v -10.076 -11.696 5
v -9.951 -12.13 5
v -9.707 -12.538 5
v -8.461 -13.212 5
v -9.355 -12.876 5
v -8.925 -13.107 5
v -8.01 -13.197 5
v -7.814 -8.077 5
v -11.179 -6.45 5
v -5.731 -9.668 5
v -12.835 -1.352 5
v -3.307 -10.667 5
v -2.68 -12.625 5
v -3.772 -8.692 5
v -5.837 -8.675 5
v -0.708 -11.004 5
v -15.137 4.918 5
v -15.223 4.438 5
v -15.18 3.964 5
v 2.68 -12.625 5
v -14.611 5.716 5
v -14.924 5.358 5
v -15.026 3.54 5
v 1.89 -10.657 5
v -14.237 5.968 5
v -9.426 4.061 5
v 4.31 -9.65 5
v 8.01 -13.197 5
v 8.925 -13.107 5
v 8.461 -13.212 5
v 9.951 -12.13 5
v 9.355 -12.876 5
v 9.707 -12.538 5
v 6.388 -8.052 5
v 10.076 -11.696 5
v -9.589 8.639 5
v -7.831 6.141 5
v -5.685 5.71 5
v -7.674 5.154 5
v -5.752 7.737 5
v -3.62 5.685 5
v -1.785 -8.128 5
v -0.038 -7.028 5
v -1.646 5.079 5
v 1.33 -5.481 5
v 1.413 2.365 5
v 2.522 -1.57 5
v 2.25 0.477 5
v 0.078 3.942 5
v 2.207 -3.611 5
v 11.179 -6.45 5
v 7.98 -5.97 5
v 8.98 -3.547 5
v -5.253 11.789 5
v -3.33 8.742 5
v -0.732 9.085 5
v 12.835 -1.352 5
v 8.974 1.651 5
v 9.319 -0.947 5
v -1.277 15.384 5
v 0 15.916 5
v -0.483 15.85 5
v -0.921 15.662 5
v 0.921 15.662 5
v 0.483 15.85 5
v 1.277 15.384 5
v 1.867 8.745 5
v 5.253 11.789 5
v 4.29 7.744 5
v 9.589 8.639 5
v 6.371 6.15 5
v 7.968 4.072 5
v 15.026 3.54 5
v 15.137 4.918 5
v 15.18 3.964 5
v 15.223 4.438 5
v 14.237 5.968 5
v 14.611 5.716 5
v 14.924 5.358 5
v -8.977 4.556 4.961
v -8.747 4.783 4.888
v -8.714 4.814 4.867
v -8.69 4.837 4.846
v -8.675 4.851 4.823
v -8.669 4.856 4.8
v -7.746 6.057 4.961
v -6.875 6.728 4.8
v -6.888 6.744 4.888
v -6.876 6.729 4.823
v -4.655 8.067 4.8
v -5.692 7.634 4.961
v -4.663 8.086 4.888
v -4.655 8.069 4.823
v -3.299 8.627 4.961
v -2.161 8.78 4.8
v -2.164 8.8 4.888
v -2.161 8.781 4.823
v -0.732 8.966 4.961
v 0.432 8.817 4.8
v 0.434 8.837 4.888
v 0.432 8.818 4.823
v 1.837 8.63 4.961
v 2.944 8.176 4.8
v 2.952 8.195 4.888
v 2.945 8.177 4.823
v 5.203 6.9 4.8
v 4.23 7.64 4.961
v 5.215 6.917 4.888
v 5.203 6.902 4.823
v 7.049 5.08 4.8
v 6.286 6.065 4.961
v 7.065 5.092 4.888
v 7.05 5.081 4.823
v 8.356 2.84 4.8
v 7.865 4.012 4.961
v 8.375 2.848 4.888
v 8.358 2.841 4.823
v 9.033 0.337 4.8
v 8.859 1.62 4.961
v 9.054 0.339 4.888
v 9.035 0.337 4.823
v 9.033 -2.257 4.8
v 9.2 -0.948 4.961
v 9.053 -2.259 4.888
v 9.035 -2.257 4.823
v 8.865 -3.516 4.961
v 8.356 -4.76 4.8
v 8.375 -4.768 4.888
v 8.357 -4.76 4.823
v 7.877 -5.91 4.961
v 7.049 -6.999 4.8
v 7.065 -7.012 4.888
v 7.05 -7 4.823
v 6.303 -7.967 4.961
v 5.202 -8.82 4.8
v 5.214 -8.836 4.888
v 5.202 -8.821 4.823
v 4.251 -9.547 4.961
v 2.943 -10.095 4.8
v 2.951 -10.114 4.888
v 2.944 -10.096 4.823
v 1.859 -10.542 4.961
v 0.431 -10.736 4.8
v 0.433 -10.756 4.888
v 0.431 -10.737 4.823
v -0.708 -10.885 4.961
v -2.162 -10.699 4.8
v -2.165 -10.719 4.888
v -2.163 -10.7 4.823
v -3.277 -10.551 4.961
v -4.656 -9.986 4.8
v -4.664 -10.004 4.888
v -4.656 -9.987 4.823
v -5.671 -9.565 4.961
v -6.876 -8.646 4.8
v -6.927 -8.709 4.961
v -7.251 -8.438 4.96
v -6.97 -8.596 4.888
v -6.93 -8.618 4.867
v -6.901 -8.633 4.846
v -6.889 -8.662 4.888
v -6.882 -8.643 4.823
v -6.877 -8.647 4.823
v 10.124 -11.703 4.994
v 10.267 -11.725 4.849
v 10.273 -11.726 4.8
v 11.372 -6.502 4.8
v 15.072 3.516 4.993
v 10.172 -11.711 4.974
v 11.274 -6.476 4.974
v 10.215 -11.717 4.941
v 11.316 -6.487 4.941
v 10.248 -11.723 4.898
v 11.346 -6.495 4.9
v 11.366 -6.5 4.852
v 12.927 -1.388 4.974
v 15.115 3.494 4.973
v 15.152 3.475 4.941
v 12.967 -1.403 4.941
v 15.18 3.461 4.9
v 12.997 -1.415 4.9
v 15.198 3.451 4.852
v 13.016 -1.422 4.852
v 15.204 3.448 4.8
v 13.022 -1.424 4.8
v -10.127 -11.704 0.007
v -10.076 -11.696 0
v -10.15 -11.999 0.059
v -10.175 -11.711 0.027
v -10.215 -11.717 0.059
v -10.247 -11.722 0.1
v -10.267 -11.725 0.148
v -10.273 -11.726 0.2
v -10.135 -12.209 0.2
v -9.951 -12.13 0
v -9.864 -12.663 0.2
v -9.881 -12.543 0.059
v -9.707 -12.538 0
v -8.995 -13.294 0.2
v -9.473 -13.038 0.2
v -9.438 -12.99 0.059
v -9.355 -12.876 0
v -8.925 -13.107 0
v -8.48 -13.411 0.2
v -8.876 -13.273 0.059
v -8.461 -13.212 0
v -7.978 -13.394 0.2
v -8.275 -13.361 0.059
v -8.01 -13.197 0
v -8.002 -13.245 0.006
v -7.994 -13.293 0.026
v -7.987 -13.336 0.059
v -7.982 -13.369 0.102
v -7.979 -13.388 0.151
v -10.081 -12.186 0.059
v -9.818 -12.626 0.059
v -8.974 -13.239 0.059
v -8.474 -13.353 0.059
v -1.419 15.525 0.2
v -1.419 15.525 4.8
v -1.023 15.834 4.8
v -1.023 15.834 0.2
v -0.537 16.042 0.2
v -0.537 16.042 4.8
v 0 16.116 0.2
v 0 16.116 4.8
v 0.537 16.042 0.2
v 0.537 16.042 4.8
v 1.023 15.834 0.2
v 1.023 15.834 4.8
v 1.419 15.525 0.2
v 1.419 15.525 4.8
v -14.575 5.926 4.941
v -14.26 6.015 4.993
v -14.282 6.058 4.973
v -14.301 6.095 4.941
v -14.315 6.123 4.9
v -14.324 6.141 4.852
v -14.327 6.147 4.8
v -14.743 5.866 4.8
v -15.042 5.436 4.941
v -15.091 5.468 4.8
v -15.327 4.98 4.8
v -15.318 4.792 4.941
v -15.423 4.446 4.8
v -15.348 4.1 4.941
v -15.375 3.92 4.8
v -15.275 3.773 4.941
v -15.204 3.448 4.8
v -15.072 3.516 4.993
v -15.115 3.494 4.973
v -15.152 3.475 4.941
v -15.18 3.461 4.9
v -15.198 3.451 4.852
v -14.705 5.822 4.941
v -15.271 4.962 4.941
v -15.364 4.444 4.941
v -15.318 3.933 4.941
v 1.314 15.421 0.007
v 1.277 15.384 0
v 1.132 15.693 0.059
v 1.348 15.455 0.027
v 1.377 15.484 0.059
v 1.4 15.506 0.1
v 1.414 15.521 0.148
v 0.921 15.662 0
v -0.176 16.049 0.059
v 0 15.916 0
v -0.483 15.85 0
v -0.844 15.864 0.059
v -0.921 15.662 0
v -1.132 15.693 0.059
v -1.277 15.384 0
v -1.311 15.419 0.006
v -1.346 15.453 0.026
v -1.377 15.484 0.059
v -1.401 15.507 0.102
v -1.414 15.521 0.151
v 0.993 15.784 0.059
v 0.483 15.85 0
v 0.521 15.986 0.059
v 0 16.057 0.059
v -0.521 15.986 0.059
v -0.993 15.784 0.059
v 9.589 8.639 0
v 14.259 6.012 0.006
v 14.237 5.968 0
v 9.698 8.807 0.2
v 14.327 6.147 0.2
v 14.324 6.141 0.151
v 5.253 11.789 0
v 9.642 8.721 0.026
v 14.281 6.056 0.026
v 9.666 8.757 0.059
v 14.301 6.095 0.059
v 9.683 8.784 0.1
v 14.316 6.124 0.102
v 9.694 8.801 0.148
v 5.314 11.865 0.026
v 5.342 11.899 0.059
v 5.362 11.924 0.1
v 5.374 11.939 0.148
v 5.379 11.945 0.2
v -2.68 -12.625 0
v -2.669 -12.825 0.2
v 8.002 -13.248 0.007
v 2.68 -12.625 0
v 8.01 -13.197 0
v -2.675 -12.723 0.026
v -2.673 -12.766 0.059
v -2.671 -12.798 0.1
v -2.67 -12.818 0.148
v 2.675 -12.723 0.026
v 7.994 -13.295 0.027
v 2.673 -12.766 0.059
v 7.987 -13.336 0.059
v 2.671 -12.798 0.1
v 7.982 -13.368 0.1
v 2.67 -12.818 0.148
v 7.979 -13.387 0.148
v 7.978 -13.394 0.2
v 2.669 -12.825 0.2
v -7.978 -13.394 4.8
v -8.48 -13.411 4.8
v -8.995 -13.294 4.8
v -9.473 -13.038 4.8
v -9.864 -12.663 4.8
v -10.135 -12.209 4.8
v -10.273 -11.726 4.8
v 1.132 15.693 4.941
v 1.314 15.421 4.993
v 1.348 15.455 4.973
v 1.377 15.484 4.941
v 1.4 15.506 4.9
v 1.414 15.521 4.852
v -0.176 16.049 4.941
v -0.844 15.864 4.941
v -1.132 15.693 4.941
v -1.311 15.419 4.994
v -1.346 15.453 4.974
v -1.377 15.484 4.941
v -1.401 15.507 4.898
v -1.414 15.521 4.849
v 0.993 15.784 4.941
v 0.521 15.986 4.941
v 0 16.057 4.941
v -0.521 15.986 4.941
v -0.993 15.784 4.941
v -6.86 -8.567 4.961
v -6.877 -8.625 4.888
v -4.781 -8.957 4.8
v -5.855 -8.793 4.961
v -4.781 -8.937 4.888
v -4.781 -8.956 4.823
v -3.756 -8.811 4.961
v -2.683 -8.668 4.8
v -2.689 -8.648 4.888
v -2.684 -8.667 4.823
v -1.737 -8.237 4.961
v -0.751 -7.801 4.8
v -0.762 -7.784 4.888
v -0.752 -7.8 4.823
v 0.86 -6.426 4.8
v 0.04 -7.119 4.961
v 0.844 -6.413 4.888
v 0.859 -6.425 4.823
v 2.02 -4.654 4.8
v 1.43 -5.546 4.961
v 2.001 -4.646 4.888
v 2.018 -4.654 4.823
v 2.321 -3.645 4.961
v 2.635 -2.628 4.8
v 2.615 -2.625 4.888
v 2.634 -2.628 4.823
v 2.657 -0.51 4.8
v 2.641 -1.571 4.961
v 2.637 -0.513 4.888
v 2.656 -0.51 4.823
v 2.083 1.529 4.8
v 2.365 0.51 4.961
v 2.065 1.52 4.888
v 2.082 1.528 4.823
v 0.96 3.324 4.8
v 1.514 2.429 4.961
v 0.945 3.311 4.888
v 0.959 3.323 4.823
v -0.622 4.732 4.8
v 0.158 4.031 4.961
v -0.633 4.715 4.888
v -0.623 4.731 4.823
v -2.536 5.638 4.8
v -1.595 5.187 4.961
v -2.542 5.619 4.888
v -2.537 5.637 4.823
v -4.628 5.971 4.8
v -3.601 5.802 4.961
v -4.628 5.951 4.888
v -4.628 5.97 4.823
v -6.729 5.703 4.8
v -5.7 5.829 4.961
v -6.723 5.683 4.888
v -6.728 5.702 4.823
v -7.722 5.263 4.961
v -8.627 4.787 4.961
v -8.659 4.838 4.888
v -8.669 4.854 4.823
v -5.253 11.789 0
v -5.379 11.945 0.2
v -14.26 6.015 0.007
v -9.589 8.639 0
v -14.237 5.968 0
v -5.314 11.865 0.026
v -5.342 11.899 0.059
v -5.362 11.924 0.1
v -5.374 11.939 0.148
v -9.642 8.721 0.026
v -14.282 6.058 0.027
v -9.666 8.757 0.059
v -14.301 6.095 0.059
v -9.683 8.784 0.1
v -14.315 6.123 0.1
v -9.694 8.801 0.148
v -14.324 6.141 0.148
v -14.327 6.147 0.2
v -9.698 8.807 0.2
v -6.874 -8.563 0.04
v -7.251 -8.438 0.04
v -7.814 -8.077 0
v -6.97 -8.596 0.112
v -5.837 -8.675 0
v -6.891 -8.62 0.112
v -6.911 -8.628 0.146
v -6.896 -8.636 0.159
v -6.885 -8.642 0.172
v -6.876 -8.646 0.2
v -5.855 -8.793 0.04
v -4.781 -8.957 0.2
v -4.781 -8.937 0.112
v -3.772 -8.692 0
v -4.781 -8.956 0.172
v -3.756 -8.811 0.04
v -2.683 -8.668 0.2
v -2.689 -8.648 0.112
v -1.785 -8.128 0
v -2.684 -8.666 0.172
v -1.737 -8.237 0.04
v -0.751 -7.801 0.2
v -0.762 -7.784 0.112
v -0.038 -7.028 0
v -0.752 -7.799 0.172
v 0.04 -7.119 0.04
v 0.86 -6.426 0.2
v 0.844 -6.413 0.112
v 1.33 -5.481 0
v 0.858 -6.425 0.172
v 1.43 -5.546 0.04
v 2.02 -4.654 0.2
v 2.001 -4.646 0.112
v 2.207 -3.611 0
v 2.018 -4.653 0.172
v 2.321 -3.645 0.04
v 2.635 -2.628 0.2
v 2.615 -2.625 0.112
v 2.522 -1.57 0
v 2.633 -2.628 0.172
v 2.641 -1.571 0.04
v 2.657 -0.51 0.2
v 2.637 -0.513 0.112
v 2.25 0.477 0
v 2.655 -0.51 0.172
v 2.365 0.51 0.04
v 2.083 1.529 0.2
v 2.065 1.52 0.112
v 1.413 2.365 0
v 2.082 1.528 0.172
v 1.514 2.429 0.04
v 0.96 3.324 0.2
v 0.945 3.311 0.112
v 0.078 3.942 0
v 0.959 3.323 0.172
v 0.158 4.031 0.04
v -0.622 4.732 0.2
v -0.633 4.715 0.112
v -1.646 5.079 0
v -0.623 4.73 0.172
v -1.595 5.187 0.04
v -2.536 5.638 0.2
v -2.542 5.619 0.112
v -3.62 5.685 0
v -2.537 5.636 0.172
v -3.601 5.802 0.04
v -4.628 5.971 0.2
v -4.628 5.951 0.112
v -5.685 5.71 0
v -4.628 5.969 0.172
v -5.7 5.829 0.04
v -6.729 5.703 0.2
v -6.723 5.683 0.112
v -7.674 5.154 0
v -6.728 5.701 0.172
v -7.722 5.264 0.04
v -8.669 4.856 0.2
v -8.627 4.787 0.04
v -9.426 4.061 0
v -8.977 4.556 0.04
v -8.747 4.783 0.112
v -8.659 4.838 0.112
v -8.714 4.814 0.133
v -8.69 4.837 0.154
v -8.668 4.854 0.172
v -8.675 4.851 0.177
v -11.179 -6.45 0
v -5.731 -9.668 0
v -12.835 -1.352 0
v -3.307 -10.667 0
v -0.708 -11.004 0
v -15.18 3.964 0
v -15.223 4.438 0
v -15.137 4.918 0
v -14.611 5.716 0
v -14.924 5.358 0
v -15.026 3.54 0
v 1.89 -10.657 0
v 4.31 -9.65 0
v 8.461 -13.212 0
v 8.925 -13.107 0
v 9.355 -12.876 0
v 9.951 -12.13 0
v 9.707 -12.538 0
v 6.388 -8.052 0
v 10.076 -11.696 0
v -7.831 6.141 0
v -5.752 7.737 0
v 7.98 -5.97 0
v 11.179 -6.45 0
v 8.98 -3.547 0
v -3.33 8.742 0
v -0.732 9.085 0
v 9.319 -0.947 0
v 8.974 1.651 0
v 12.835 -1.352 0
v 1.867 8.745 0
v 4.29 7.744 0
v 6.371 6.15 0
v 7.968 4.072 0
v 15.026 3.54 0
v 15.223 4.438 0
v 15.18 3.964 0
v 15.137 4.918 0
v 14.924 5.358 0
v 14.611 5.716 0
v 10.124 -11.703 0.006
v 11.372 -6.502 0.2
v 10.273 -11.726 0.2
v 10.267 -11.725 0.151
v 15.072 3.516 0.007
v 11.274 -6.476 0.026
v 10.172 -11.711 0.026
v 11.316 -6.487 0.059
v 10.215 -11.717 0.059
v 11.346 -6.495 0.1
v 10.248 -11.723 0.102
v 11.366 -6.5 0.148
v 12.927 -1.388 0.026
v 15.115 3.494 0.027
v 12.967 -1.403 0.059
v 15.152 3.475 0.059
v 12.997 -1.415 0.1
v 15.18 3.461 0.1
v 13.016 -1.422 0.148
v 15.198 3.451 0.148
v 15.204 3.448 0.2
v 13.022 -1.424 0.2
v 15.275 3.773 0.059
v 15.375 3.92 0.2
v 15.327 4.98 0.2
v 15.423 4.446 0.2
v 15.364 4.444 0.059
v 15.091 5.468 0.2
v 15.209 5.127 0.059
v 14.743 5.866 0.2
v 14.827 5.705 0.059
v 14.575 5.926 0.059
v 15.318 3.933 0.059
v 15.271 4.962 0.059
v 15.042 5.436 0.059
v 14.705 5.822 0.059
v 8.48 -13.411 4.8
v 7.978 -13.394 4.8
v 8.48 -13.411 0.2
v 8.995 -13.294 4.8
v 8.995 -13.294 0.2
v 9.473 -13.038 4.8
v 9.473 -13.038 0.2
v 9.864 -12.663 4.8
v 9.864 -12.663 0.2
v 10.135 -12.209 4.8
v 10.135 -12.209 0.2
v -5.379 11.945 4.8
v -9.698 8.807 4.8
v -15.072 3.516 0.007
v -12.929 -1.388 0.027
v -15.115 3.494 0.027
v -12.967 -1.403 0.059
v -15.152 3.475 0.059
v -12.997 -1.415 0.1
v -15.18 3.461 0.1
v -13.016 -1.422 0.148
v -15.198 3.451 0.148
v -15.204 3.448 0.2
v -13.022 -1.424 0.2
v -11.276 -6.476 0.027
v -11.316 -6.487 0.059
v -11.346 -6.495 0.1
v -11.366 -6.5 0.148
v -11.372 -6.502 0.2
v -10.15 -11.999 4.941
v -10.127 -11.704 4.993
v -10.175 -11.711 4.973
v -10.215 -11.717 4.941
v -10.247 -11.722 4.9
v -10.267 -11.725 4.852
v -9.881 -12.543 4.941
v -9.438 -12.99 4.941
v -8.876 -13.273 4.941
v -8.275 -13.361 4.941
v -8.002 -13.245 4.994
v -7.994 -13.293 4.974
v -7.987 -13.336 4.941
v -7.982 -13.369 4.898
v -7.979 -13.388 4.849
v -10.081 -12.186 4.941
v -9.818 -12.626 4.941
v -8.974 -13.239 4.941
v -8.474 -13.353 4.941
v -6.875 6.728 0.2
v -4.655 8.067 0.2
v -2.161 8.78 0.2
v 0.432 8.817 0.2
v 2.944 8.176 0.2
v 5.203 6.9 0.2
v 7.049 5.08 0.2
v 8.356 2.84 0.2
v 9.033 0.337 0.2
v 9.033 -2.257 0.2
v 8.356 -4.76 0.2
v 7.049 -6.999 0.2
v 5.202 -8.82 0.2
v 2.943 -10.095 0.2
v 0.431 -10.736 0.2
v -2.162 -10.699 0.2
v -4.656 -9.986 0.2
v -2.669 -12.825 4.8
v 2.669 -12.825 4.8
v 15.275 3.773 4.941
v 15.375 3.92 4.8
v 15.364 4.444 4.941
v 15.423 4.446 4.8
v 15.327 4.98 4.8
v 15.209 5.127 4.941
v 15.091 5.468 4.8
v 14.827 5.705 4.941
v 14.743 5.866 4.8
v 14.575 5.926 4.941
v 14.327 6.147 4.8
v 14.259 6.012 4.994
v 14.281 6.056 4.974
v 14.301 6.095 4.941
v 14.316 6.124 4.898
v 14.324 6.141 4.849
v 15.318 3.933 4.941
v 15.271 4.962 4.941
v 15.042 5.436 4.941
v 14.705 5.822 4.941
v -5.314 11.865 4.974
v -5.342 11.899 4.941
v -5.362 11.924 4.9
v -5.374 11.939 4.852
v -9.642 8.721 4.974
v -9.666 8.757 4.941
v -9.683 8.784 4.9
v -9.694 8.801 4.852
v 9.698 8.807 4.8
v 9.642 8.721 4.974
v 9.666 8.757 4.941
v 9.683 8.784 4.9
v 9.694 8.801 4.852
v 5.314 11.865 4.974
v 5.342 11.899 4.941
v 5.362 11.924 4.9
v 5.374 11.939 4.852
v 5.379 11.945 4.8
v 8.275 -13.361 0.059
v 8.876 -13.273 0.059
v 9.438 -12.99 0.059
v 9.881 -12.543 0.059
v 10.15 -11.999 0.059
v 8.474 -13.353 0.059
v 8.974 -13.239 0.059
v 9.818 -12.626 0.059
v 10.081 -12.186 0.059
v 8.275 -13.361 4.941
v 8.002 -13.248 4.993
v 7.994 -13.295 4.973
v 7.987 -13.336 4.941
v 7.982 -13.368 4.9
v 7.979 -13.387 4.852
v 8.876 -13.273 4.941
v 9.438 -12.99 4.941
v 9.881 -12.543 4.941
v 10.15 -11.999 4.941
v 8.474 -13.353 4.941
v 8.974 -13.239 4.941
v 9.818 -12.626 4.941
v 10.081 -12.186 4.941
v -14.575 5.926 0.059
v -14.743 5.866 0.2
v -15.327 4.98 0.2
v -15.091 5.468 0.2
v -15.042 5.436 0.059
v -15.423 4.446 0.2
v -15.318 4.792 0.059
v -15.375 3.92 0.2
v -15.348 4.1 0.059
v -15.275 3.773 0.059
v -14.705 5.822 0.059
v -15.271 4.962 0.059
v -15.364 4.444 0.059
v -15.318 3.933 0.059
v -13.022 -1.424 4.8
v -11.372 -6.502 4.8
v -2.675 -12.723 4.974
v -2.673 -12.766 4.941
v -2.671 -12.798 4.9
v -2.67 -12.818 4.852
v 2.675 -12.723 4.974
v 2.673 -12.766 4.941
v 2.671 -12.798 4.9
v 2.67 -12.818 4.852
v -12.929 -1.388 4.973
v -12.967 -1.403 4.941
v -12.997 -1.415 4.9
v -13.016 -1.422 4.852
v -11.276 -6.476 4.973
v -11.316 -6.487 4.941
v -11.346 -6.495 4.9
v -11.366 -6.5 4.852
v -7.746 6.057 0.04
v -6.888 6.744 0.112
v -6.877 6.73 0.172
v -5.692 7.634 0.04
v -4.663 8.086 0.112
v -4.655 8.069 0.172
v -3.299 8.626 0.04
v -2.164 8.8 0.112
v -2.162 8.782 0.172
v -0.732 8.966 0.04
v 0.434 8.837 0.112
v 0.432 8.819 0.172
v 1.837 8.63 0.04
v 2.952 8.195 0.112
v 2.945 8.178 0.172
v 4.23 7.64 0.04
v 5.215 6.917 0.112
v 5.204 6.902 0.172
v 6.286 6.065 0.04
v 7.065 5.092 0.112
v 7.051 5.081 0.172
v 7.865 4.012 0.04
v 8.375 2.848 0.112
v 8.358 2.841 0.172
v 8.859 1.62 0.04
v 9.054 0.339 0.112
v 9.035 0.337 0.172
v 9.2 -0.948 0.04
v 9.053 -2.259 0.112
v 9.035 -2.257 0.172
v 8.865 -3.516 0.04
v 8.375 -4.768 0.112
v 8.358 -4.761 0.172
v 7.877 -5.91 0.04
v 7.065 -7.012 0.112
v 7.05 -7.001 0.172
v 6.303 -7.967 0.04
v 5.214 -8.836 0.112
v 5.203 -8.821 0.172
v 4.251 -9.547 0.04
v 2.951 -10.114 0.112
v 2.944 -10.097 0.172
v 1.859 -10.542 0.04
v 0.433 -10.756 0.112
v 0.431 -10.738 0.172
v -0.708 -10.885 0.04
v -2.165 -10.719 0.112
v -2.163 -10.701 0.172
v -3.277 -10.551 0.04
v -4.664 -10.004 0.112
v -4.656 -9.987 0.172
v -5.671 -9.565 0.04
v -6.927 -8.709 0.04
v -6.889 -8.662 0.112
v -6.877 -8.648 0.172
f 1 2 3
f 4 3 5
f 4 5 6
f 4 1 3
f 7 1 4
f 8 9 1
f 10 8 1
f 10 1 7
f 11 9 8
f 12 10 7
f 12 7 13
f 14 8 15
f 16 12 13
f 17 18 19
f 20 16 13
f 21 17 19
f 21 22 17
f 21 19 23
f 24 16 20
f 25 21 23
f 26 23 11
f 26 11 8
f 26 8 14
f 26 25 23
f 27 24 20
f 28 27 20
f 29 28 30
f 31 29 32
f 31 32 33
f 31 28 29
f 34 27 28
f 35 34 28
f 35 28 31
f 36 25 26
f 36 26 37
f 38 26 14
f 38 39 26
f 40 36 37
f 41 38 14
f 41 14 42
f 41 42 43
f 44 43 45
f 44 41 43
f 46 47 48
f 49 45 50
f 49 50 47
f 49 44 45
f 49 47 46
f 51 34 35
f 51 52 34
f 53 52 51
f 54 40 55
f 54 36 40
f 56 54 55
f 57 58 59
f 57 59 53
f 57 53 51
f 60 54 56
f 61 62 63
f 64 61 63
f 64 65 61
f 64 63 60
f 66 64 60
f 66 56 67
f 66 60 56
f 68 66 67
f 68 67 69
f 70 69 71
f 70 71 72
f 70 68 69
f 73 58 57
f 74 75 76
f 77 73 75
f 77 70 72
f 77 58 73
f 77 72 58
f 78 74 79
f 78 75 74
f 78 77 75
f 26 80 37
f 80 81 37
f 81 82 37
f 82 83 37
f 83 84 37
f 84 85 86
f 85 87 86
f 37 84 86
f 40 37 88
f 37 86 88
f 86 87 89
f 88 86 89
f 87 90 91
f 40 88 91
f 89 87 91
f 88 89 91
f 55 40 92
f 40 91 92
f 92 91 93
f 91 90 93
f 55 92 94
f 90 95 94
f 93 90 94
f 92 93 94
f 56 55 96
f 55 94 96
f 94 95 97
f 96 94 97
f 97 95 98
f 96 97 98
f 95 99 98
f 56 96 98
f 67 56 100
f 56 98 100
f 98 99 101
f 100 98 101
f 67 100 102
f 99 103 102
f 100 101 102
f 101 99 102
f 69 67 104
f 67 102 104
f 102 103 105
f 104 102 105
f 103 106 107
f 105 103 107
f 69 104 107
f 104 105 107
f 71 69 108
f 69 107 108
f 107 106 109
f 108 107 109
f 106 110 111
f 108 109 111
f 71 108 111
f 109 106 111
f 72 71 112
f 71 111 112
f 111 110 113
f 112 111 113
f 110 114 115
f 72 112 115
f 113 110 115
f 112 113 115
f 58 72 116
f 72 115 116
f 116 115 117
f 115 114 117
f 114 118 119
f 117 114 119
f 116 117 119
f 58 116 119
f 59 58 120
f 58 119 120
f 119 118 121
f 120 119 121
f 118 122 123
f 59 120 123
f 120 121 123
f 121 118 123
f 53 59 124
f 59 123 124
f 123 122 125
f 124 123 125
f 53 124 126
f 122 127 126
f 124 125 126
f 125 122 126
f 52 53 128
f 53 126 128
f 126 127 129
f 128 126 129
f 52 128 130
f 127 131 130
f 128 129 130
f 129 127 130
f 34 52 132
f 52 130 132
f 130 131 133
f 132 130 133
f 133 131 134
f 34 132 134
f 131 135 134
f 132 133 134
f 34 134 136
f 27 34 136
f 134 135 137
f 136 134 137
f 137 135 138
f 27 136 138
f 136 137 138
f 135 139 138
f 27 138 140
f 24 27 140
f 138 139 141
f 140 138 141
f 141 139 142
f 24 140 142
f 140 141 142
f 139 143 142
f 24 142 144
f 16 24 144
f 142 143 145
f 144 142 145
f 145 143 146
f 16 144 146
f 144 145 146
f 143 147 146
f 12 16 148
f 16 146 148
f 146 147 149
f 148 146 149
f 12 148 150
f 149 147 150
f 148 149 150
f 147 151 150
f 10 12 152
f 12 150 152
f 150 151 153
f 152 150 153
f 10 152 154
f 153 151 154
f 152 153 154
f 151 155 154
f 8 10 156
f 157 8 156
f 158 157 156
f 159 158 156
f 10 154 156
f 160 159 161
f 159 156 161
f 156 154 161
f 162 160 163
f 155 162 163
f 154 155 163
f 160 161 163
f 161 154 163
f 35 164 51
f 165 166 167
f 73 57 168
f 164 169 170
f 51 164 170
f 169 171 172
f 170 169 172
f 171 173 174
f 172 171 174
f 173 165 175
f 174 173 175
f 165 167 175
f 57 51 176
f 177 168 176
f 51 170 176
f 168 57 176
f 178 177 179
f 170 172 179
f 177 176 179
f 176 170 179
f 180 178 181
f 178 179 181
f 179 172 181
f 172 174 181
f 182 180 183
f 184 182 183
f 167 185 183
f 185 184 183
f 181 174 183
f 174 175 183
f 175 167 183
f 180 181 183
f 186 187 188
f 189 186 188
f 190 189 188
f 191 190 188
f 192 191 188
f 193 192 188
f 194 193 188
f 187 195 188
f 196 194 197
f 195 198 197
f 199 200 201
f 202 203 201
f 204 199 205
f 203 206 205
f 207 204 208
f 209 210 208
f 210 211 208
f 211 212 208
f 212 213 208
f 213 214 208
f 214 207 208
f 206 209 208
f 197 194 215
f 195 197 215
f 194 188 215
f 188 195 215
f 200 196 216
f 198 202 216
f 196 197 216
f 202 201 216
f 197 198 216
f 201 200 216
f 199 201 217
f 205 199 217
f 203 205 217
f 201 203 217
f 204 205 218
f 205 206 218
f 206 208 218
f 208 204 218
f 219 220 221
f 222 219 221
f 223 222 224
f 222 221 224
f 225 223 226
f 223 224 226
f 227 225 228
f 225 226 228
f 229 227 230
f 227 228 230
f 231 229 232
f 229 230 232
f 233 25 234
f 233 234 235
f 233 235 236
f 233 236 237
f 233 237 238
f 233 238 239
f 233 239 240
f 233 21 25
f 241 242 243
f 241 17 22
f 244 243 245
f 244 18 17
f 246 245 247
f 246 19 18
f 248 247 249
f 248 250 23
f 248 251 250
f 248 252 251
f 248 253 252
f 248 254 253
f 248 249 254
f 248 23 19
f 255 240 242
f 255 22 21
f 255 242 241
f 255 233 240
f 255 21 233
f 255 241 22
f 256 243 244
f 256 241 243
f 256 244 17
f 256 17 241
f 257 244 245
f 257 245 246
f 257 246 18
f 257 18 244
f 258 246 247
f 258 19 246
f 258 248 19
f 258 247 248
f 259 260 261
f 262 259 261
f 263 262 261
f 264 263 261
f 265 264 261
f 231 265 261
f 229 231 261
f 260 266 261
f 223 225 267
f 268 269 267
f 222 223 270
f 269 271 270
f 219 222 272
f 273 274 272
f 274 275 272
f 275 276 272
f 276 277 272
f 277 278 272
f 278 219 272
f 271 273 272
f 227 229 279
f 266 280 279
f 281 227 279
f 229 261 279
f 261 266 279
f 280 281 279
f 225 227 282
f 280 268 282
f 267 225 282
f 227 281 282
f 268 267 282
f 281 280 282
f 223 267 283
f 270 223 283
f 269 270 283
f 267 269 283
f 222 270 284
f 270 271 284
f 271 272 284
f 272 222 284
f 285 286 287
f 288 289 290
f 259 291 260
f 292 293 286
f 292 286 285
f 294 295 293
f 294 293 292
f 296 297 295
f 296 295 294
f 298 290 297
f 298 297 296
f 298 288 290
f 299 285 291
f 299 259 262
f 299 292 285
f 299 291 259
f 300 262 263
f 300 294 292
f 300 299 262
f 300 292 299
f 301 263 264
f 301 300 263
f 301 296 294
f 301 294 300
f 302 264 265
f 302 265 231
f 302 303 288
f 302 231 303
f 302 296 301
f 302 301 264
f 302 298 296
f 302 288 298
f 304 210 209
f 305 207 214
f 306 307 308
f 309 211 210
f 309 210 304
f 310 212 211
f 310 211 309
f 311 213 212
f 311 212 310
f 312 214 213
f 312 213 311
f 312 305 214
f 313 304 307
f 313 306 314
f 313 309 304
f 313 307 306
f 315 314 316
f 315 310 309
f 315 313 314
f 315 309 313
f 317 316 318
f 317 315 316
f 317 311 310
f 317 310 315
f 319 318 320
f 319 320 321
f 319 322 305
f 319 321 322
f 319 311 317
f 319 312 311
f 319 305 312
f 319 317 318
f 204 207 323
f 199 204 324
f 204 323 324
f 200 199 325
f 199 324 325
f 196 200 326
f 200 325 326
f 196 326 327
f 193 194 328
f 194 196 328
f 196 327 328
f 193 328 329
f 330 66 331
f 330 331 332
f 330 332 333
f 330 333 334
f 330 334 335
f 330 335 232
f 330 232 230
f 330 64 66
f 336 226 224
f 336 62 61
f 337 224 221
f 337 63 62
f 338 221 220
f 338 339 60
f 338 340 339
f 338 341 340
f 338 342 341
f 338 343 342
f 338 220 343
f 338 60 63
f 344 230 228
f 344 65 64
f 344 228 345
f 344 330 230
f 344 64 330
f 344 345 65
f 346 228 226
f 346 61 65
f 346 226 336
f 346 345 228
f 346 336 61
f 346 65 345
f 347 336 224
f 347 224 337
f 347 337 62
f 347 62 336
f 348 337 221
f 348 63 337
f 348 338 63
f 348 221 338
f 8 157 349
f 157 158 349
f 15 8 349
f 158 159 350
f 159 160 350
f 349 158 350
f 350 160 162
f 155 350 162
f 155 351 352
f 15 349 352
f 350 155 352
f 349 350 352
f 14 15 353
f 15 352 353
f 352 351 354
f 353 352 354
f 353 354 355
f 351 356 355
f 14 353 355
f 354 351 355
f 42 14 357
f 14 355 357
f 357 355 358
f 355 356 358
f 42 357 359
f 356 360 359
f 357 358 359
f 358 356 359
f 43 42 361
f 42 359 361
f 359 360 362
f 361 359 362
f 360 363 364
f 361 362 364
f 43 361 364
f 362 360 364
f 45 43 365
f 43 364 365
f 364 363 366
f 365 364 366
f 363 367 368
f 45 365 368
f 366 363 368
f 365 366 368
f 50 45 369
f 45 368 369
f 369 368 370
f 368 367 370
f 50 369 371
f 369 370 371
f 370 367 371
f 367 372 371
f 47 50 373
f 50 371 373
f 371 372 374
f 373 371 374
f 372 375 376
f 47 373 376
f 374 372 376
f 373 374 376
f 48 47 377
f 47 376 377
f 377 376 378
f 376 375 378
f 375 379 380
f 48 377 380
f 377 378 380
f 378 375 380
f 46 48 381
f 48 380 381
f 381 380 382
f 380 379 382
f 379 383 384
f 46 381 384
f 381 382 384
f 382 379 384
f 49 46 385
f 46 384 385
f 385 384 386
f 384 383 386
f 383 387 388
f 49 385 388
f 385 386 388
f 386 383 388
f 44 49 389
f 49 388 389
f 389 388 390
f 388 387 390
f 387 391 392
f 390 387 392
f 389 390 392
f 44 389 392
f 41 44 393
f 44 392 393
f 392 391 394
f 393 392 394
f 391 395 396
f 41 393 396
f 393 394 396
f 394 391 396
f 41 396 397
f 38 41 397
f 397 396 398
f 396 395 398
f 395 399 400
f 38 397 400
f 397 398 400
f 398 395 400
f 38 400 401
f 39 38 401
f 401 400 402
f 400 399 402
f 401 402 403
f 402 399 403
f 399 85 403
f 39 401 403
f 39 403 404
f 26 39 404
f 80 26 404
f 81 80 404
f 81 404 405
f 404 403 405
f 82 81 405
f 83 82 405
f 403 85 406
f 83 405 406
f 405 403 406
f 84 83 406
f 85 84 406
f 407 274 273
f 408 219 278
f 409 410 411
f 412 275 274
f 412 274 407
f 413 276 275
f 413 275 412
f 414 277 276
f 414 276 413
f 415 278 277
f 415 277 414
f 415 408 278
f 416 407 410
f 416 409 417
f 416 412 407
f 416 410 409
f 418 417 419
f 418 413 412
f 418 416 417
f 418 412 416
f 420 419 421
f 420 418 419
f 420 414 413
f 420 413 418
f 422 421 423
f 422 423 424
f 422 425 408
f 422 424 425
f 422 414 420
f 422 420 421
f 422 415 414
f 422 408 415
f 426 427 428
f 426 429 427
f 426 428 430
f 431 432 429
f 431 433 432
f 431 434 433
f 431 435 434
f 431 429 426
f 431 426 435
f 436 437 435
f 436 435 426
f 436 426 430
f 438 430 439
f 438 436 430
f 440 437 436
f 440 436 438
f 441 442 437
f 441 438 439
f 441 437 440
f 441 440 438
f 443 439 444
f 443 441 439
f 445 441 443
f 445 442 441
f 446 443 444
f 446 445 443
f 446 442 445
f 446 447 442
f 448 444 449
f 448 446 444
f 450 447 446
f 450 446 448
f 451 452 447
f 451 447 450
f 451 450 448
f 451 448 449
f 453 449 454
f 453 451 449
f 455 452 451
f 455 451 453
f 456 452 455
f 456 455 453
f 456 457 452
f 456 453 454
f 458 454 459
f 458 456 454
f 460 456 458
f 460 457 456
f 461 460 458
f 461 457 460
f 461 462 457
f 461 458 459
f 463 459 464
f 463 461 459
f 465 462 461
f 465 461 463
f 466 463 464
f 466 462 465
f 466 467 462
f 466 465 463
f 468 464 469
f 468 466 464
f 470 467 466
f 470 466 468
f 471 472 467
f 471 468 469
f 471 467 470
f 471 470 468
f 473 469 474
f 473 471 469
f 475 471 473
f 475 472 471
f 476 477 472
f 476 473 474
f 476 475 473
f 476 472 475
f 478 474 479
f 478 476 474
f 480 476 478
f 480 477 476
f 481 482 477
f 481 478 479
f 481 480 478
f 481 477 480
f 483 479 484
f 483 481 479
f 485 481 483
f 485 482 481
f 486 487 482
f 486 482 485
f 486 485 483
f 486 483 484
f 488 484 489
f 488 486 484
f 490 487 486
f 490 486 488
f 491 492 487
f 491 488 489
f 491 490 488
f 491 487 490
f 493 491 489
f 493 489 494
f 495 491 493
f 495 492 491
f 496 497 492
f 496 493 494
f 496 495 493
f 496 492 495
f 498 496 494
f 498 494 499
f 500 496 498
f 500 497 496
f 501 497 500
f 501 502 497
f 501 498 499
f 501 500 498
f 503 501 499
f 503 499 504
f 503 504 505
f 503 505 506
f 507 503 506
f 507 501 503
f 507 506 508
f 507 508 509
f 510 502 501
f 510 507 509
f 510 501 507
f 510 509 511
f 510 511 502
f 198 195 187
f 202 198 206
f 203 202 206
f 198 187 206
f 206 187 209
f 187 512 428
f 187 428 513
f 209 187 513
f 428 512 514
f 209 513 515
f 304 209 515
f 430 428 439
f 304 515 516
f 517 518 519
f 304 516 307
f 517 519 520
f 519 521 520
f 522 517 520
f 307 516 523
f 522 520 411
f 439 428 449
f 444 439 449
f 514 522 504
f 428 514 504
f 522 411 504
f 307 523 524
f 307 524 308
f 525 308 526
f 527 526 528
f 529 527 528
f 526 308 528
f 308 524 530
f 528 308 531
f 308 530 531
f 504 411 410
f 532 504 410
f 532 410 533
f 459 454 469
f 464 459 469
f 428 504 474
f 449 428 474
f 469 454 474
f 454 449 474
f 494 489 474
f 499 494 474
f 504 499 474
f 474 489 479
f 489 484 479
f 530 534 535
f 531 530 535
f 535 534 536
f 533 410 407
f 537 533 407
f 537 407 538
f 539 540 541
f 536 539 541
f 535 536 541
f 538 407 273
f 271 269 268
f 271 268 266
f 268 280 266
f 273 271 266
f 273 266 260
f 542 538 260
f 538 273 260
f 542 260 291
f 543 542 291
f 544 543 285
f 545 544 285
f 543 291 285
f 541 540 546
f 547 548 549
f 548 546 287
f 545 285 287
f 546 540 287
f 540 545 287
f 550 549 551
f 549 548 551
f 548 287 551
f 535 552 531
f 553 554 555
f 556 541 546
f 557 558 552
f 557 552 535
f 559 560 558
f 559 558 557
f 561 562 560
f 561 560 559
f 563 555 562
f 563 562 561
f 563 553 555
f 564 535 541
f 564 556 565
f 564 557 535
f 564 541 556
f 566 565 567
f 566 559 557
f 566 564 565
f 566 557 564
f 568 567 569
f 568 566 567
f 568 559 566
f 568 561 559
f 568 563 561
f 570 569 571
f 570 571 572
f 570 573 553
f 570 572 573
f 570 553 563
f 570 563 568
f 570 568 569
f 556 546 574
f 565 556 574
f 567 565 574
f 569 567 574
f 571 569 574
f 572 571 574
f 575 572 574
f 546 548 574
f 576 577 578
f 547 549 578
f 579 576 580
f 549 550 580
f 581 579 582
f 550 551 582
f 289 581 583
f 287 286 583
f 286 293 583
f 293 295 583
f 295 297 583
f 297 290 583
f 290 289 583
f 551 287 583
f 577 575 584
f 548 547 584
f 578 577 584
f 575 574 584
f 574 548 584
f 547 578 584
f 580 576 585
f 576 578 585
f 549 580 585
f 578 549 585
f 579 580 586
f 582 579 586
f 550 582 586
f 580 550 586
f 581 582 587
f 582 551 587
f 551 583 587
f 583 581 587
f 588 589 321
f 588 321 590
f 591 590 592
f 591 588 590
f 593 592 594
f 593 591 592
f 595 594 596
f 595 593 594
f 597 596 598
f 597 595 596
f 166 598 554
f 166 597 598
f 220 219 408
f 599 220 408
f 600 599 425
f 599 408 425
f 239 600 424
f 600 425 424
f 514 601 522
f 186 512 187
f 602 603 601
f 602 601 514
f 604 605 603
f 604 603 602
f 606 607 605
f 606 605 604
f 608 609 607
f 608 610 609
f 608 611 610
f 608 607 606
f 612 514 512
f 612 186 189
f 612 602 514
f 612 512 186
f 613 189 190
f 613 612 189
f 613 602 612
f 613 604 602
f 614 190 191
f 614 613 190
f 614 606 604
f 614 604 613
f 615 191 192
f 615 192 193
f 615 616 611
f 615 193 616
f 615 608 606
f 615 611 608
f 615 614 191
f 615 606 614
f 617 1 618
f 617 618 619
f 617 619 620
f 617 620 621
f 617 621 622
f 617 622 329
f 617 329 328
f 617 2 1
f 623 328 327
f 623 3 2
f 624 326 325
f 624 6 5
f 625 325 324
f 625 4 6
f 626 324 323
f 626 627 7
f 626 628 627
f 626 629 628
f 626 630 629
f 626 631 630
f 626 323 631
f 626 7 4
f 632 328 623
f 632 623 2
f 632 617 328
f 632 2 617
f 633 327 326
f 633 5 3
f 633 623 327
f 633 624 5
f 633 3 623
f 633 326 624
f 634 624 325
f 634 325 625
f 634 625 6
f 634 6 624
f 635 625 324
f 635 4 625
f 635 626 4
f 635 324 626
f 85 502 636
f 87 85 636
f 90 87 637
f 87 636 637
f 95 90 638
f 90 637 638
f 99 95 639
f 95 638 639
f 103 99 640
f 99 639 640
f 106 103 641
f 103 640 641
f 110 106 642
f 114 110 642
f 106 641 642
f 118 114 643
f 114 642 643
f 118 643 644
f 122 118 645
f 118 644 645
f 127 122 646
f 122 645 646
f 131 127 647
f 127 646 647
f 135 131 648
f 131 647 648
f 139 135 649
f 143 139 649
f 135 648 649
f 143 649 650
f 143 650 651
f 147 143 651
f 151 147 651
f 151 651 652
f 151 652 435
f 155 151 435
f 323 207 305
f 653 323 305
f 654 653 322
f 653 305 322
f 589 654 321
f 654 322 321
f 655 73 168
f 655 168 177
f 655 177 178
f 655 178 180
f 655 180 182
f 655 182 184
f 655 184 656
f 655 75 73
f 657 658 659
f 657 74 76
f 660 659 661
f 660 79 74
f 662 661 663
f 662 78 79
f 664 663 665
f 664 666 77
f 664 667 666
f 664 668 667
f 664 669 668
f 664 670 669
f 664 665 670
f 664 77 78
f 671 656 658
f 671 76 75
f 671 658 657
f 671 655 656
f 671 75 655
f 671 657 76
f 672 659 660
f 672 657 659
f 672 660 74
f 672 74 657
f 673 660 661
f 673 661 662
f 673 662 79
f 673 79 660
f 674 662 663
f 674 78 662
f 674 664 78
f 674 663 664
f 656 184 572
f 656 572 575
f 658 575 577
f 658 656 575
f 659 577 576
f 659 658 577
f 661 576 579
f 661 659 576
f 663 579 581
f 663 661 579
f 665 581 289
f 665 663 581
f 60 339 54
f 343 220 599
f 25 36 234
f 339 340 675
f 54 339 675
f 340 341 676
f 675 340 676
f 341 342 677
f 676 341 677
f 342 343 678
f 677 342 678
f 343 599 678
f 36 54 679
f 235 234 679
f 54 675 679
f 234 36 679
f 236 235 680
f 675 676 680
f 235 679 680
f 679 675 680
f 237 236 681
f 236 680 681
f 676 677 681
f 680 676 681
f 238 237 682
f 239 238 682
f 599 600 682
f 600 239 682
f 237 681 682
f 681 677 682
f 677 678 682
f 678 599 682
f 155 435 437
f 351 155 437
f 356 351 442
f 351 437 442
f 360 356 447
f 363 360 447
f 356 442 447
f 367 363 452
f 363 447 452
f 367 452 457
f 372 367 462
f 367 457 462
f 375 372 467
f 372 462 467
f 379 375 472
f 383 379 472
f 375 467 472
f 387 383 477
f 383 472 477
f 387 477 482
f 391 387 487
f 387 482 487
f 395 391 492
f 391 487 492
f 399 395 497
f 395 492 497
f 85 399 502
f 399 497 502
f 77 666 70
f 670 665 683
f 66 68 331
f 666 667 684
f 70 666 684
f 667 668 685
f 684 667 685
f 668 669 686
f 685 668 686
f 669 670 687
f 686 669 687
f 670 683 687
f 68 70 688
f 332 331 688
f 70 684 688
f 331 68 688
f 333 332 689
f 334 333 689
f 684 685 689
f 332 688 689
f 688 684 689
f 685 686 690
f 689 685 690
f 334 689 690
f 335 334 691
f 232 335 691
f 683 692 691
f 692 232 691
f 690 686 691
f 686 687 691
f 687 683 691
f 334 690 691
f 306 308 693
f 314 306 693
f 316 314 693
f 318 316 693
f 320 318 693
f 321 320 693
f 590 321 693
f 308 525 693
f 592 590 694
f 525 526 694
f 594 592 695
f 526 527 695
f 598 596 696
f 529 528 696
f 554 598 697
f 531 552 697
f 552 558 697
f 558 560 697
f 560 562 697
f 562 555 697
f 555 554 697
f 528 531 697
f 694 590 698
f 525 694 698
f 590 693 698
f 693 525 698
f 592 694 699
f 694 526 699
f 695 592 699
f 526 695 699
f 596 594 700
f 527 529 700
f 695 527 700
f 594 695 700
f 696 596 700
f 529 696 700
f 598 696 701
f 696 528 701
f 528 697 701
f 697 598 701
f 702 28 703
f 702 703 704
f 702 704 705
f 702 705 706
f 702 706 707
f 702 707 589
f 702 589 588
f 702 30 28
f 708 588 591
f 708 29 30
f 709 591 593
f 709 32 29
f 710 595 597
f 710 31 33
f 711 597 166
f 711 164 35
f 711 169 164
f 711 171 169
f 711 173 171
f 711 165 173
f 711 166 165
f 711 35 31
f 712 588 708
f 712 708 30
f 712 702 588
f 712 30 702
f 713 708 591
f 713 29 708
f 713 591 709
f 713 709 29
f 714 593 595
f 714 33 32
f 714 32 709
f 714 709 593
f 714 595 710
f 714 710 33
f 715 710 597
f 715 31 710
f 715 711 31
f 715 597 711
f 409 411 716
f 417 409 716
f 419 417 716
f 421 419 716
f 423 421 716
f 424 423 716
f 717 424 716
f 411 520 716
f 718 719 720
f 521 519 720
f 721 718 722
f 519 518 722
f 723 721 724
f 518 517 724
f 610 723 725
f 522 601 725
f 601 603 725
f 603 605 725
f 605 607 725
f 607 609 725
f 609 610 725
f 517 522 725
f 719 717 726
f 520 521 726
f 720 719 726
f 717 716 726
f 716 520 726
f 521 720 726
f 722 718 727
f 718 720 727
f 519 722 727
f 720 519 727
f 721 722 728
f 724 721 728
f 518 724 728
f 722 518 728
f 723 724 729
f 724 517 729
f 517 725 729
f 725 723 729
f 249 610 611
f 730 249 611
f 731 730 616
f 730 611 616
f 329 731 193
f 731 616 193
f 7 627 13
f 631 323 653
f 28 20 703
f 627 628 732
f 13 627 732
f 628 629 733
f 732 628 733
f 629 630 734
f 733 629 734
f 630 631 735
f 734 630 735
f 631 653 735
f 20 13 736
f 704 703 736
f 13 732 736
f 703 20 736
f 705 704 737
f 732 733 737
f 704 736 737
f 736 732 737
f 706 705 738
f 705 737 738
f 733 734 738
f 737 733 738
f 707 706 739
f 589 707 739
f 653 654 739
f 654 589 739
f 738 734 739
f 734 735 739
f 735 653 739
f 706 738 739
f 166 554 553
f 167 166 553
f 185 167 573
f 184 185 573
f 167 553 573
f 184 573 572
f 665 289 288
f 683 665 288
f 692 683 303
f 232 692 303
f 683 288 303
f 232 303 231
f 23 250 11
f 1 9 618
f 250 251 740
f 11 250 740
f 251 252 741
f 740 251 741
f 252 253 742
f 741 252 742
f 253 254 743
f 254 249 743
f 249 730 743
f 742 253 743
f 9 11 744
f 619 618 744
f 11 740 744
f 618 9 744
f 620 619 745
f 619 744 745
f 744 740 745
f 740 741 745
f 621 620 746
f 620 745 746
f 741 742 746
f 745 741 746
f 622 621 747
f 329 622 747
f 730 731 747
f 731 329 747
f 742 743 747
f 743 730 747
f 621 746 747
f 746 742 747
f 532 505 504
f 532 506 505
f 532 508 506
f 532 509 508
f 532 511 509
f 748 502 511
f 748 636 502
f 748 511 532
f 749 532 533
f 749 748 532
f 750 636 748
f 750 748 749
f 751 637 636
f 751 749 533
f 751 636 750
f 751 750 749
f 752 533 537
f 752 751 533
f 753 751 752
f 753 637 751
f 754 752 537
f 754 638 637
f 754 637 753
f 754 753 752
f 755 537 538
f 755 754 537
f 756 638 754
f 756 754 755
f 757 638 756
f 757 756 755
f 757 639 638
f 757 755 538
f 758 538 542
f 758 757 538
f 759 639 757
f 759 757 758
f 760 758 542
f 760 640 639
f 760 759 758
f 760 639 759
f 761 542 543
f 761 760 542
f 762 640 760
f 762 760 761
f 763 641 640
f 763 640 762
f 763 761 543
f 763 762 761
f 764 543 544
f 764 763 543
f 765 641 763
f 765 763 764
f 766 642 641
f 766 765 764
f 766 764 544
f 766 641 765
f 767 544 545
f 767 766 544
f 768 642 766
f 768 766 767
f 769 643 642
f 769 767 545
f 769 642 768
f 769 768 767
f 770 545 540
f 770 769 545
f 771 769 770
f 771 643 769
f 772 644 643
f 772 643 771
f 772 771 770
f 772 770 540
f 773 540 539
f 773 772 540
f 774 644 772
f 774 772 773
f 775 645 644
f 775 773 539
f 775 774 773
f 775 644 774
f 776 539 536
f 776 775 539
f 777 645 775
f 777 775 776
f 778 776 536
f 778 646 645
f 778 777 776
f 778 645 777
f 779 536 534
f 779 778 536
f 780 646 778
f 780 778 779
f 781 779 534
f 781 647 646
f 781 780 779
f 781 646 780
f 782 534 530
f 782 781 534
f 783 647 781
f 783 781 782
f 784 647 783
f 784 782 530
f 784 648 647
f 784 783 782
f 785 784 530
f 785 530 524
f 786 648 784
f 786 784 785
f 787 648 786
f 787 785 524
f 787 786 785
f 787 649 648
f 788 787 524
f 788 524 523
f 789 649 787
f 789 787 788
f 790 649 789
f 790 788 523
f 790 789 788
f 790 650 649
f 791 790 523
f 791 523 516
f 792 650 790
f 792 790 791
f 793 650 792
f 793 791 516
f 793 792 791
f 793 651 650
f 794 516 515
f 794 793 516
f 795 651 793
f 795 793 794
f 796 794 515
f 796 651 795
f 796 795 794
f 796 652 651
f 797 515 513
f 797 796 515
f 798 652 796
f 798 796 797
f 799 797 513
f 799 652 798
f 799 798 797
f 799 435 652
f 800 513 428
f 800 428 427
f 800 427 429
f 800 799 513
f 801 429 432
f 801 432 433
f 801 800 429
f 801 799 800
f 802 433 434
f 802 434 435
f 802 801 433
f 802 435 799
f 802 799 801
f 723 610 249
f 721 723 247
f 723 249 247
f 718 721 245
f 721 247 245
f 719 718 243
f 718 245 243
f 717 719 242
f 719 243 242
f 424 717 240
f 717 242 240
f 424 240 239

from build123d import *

# Parameters (mm, degrees)
F1_DEPTH = 5
F2_R     = 2
F3_R     = 0.2


with BuildPart() as f1:
    # F0 (on Top) → F1 (new body)
    with BuildSketch(Plane.XY):
        with BuildLine():
            ThreePointArc((-10, -13.763819), (0, -12.753614), (10, -13.763819))
            ThreePointArc((10, -13.763819), (12.129408, -3.941083), (16.18034, 5.257311))
            ThreePointArc((16.18034, 5.257311), (7.496386, 10.317891), (0, 17.013016))
            ThreePointArc((0, 17.013016), (-7.496386, 10.317891), (-16.18034, 5.257311))
            ThreePointArc((-16.18034, 5.257311), (-12.129408, -3.941083), (-10, -13.763819))
        make_face()
        with BuildLine():
            ThreePointArc((-8.66945, 4.855534), (9.033492, 0.336782), (-6.876256, -8.646158))
            ThreePointArc((-6.876256, -8.646158), (2.657094, -0.510084), (-8.66945, 4.855534))
        make_face(mode=Mode.SUBTRACT)
    extrude(amount=F1_DEPTH)

    # F2
    f2_edges = [f1.edges().sort_by_distance(p)[0] for p in [
        (-16.18034, 5.257311, 2.5),
        (0, 17.013016, 2.5),
        (16.18034, 5.257311, 2.5),
        (10, -13.763819, 2.5),
        (-10, -13.763819, 2.5),
    ]]
    fillet(f2_edges, radius=F2_R)

    # F3
    f3_edges = [f1.edges().sort_by_distance(p)[0] for p in [
        (-12.129408, -3.941083, 5),
        (-15.326895, 4.98001, 5),
        (-9.472542, -13.037836, 5),
        (-7.496386, 10.317891, 5),
        (0, -12.753614, 5),
        (0, 16.115652, 5),
        (9.472542, -13.037836, 5),
        (7.496386, 10.317891, 5),
        (12.129408, -3.941083, 5),
        (15.326895, 4.98001, 5),
        (9.033492, 0.336782, 5),
        (2.657094, -0.510084, 5),
        (-12.129408, -3.941083, 0),
        (-15.326895, 4.98001, 0),
        (-9.472542, -13.037836, 0),
        (-7.496386, 10.317891, 0),
        (0, -12.753614, 0),
        (0, 16.115652, 0),
        (9.472542, -13.037836, 0),
        (7.496386, 10.317891, 0),
        (12.129408, -3.941083, 0),
        (15.326895, 4.98001, 0),
        (9.033492, 0.336782, 0),
        (2.657094, -0.510084, 0),
    ]]
    fillet(f3_edges, radius=F3_R)


solid = f1.part
